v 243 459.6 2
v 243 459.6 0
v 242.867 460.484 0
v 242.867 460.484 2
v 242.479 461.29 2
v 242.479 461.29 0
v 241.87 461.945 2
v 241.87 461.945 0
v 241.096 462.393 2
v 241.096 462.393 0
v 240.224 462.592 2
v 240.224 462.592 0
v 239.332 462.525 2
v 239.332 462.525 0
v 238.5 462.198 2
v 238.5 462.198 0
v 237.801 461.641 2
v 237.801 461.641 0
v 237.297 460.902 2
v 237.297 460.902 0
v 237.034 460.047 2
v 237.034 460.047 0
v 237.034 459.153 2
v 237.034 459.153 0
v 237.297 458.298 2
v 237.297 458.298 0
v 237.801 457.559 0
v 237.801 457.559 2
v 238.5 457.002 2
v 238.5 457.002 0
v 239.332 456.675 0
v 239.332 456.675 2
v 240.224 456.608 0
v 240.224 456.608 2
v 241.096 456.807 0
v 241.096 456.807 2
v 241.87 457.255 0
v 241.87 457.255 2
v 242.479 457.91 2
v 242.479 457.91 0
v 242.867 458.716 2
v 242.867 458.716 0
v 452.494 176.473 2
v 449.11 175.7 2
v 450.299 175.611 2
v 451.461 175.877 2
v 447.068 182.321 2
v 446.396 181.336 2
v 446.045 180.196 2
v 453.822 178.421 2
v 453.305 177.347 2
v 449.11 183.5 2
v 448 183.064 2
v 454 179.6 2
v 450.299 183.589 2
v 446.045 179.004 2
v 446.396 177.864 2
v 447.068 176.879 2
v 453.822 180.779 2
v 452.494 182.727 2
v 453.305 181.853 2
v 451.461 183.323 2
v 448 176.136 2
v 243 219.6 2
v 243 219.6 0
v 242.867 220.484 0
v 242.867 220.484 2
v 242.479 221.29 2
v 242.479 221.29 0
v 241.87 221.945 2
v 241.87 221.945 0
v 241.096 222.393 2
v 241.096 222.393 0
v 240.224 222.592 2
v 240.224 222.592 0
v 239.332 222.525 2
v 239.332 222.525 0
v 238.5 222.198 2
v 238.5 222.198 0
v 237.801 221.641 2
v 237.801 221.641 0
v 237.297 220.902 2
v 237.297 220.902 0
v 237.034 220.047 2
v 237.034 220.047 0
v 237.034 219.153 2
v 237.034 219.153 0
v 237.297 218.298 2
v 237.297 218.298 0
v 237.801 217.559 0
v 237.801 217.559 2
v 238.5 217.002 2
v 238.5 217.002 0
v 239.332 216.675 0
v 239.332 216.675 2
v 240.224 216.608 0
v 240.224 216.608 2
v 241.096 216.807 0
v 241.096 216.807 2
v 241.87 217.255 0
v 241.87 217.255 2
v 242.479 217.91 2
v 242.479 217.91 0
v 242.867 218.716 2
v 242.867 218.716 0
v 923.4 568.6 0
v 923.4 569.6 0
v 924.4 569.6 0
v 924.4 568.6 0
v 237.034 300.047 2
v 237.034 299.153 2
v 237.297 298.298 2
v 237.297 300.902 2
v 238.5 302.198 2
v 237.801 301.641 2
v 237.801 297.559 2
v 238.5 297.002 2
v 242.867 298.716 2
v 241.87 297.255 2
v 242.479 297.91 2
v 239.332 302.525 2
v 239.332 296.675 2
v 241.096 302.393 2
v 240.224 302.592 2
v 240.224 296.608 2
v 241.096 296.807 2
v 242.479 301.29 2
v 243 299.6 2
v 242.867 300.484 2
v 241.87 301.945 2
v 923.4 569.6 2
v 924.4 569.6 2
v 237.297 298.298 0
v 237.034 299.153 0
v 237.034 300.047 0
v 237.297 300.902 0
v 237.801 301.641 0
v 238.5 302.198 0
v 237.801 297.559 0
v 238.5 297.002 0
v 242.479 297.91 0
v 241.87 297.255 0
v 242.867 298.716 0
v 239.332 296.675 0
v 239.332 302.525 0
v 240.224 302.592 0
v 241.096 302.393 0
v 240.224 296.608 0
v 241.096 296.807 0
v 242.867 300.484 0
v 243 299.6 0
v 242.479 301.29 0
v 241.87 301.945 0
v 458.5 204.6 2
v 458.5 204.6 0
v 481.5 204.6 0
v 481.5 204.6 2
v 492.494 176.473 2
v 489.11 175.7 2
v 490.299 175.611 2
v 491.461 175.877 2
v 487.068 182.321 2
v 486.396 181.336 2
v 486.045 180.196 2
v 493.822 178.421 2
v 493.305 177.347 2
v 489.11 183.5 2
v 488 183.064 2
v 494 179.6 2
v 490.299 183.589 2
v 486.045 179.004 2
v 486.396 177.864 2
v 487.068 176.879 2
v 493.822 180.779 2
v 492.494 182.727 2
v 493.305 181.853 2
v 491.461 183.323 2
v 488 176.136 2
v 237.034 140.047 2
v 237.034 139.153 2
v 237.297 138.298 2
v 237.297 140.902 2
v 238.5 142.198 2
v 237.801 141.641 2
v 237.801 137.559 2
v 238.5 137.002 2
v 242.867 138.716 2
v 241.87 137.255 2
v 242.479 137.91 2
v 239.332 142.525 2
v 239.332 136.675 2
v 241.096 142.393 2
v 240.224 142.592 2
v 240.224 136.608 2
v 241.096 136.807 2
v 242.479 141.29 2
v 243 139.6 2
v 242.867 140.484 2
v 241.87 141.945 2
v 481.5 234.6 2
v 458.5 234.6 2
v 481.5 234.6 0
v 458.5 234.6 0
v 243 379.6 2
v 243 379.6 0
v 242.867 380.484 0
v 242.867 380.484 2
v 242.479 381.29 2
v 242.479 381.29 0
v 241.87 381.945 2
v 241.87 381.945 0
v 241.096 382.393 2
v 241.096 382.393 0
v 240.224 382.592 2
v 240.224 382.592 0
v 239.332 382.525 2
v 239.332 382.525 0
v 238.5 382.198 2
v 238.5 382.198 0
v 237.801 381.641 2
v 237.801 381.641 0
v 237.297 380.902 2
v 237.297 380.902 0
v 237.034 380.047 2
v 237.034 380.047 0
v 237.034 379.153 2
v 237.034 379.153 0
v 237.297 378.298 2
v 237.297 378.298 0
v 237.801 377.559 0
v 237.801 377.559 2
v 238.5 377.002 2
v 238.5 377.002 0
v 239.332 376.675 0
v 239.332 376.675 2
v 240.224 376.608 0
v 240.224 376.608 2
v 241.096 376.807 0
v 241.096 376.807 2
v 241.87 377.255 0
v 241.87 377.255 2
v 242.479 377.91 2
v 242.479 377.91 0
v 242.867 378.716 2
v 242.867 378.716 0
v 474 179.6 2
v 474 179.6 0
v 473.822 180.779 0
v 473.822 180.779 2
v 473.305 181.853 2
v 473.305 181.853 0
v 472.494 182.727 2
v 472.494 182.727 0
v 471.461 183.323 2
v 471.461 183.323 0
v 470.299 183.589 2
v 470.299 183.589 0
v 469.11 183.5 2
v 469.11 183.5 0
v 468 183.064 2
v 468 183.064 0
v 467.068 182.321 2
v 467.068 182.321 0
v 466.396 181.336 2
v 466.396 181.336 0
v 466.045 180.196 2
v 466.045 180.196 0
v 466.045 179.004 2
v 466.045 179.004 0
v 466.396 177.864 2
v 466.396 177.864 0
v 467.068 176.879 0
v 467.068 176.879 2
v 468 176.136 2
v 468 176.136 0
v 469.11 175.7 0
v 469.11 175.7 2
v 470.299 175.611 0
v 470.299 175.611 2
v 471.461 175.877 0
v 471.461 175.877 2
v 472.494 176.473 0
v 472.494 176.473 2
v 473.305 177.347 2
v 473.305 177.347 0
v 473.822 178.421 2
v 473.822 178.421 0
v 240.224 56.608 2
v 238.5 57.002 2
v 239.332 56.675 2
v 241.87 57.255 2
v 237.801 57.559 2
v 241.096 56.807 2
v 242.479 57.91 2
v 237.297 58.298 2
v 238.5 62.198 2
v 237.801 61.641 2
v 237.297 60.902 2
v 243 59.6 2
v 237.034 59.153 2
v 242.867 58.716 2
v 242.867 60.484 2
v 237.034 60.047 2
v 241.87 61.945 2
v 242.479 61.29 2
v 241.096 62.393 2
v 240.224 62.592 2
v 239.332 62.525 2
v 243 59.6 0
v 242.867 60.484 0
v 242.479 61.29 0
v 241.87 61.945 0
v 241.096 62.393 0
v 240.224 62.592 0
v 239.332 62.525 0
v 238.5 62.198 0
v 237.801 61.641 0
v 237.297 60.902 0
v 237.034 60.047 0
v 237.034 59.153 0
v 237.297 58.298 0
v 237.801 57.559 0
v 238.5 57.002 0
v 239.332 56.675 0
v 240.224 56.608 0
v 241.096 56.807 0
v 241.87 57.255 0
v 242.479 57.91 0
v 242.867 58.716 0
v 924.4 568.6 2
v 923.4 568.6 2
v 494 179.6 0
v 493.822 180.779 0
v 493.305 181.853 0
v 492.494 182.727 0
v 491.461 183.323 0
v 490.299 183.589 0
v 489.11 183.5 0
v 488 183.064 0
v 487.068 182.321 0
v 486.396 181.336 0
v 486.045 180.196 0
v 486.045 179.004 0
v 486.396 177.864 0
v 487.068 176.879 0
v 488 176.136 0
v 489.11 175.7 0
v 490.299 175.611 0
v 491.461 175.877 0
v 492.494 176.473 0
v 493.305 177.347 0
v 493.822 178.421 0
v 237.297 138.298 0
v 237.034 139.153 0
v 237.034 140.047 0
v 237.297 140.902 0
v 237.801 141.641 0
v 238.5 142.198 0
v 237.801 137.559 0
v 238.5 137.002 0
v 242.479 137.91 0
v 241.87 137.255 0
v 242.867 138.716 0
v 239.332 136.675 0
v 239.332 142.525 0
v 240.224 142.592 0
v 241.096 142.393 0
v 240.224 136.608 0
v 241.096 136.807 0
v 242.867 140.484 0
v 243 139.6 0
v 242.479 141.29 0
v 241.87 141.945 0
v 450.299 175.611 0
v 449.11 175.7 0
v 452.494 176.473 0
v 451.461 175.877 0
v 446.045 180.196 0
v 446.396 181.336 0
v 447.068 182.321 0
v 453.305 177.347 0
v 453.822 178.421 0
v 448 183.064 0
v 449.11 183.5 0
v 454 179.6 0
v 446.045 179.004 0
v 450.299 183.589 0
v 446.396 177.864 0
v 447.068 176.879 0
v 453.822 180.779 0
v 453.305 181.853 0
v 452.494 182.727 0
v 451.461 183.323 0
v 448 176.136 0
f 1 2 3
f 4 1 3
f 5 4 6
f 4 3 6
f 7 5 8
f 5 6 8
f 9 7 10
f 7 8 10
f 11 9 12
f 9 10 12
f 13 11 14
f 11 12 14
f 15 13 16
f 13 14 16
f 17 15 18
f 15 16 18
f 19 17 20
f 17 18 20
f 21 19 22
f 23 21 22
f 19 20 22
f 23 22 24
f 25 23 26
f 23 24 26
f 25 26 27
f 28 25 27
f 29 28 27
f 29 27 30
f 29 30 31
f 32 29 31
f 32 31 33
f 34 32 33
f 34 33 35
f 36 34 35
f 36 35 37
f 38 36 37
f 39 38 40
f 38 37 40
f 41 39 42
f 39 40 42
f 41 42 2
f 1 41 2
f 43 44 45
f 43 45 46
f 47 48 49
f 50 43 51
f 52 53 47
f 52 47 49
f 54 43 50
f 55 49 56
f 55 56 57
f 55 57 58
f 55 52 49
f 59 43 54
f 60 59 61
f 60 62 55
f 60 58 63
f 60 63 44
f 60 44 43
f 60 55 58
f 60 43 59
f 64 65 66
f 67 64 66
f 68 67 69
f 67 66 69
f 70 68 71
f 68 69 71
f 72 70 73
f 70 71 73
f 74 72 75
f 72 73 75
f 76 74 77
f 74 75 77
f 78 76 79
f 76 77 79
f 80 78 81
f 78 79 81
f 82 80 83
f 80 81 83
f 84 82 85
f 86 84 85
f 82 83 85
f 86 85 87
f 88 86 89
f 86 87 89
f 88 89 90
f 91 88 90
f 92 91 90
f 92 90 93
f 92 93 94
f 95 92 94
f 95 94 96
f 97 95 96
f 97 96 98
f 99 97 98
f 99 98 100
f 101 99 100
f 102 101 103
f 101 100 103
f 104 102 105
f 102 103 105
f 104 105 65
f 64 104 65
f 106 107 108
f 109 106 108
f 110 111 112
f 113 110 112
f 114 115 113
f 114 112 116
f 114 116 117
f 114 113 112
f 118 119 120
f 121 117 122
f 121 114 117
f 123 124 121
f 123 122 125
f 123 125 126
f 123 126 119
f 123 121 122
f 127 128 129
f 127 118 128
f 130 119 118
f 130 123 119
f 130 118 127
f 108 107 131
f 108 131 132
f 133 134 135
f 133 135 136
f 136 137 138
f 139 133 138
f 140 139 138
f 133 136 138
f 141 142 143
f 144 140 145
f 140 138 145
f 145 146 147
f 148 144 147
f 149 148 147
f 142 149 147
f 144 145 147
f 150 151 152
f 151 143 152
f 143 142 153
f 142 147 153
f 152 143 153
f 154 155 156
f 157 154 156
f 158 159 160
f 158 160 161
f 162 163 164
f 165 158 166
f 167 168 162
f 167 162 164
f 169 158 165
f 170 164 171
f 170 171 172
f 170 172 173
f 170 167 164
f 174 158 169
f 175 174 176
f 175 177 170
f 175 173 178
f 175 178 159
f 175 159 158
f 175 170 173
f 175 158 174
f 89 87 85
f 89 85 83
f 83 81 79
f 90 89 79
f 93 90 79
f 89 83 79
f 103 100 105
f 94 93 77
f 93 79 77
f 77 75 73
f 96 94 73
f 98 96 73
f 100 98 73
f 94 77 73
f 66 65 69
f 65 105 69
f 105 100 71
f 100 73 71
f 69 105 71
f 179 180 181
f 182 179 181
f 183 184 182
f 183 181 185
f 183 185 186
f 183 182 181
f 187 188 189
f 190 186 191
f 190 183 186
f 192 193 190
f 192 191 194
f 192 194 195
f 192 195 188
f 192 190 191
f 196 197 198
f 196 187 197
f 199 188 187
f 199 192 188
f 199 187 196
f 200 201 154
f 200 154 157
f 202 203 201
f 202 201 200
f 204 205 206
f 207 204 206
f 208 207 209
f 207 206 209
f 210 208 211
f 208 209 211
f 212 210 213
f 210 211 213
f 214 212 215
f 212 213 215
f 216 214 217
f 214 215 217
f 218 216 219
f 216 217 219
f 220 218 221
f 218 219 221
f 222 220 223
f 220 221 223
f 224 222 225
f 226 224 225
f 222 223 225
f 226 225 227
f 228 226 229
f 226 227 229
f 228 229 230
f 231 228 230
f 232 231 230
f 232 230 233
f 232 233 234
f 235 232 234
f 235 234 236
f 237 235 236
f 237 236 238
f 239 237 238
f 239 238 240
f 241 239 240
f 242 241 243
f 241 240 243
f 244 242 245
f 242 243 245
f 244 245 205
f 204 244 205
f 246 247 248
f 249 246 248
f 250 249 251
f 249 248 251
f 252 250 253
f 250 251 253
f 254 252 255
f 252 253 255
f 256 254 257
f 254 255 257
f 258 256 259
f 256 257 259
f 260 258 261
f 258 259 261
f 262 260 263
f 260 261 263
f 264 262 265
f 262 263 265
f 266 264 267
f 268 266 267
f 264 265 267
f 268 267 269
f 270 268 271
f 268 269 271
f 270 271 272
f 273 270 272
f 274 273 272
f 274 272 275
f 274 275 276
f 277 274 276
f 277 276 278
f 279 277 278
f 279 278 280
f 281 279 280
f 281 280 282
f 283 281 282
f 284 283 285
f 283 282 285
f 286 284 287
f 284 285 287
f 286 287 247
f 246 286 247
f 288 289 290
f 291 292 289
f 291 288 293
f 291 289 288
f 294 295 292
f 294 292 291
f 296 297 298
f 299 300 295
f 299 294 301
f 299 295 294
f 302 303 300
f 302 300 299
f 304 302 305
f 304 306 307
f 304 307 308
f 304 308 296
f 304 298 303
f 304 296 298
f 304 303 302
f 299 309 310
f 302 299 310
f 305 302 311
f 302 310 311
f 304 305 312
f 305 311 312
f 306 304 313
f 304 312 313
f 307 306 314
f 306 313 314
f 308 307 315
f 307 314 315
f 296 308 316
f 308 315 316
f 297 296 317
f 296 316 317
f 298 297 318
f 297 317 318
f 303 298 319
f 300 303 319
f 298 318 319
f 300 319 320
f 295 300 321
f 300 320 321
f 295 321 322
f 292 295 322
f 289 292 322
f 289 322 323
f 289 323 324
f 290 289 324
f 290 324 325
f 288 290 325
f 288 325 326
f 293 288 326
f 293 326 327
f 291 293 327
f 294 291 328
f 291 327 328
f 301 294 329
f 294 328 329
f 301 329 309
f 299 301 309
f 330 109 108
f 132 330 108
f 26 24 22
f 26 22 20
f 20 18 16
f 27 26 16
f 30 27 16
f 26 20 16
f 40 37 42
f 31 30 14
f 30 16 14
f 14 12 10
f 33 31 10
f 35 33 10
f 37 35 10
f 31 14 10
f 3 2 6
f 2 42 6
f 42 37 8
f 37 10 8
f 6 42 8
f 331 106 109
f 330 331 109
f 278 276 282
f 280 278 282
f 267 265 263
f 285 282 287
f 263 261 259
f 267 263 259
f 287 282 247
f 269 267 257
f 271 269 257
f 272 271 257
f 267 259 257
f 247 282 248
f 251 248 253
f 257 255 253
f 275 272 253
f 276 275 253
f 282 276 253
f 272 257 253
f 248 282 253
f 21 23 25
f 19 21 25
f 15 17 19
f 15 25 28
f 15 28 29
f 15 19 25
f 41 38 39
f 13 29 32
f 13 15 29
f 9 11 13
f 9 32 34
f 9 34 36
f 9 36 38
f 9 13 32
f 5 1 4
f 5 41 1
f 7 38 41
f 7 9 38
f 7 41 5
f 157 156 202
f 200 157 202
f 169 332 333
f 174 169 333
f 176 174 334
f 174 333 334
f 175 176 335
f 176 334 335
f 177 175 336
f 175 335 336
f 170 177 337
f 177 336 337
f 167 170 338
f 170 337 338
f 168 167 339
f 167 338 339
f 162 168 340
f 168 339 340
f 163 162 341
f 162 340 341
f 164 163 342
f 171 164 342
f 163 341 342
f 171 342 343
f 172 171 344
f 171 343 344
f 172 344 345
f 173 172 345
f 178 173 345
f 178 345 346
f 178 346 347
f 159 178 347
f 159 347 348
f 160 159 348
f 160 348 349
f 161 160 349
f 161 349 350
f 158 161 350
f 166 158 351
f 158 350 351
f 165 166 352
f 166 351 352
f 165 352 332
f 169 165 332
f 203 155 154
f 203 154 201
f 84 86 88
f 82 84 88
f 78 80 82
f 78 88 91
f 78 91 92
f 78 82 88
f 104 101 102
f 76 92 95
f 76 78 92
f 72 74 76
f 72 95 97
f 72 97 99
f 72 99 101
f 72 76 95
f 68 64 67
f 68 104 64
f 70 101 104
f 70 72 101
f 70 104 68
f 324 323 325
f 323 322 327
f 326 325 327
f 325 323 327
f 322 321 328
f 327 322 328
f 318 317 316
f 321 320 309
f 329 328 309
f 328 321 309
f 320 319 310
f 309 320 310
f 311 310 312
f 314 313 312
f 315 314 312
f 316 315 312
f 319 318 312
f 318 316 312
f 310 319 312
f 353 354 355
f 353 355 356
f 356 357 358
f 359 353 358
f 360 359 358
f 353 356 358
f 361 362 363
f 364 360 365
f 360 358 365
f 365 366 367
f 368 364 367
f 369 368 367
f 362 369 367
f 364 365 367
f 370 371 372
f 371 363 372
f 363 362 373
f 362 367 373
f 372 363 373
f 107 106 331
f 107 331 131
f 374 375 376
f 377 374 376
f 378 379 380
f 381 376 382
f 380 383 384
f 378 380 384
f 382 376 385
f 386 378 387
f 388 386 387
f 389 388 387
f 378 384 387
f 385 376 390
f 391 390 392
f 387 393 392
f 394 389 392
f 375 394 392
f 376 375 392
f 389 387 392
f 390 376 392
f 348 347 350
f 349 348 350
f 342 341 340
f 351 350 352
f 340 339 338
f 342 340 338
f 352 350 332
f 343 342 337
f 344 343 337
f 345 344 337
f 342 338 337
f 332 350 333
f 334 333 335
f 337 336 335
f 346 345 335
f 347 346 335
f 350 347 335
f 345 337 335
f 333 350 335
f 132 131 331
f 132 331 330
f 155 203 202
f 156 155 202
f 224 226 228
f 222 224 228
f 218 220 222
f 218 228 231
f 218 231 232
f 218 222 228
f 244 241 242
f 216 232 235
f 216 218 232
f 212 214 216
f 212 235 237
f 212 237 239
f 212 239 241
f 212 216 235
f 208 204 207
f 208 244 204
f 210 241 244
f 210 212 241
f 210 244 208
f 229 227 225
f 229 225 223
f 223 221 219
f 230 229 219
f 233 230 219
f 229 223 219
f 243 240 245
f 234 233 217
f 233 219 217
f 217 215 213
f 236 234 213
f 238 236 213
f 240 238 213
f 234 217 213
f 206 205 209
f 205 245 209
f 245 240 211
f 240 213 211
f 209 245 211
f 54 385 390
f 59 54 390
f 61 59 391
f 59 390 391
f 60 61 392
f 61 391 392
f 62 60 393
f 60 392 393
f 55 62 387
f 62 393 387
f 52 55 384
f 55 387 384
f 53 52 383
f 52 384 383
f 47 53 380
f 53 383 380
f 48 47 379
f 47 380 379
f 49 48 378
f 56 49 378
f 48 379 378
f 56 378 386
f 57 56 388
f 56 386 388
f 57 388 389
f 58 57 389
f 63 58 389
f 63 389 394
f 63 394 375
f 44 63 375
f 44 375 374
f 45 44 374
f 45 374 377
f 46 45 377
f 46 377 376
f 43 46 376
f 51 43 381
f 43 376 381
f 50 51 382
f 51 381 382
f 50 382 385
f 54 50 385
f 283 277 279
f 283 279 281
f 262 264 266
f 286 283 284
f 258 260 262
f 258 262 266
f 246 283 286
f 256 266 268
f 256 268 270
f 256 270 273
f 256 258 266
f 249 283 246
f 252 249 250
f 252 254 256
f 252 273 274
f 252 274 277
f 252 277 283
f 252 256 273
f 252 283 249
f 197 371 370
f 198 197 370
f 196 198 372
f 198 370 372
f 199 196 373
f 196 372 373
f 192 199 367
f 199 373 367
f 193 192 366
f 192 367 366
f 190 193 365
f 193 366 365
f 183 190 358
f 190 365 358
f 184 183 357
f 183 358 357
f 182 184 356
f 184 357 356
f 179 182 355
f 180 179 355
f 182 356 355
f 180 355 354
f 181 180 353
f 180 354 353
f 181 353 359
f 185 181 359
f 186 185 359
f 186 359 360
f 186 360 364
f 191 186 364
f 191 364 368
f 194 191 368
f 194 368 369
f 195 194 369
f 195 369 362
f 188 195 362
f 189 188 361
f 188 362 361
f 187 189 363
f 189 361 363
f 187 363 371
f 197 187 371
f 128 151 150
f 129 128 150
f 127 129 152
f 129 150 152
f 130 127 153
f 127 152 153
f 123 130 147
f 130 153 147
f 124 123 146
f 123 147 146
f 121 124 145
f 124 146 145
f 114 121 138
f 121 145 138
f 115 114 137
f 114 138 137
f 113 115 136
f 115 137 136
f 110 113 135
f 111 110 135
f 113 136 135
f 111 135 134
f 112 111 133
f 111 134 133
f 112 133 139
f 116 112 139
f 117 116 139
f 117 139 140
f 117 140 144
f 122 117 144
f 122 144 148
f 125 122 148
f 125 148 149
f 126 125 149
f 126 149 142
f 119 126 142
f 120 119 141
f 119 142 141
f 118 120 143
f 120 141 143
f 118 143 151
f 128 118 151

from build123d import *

# Parameters (mm, degrees)
SKETCH1_R              = 3
BOSS_EXTRUDE1_DEPTH    = 2
BOSS_EXTRUDE1_2_DEPTH  = 2
BOSS_EXTRUDE1_3_DEPTH  = 2
BOSS_EXTRUDE1_4_DEPTH  = 2
BOSS_EXTRUDE1_5_DEPTH  = 2
BOSS_EXTRUDE1_6_DEPTH  = 2
SKETCH1_W              = 23
SKETCH1_H              = 30
BOSS_EXTRUDE1_7_DEPTH  = 2
SKETCH1_R_2            = 4
BOSS_EXTRUDE1_8_DEPTH  = 2
BOSS_EXTRUDE1_9_DEPTH  = 2
BOSS_EXTRUDE1_10_DEPTH = 2
SKETCH1_W_2            = 1
SKETCH1_H_2            = 1
BOSS_EXTRUDE1_11_DEPTH = 2


with BuildPart() as part:
    # Sketch1 → Boss-Extrude1 (new body)
    with BuildSketch(Plane.XY):
        with Locations((240, 299.6)):
            Circle(SKETCH1_R)
    extrude(amount=BOSS_EXTRUDE1_DEPTH)


with BuildPart() as body_2:
    # Sketch1 → Boss-Extrude1 2 (new body)
    with BuildSketch(Plane.XY):
        with Locations((240, 379.6)):
            Circle(SKETCH1_R)
    extrude(amount=BOSS_EXTRUDE1_2_DEPTH)


with BuildPart() as body_3:
    # Sketch1 → Boss-Extrude1 3 (new body)
    with BuildSketch(Plane.XY):
        with Locations((240, 459.6)):
            Circle(SKETCH1_R)
    extrude(amount=BOSS_EXTRUDE1_3_DEPTH)


with BuildPart() as body_4:
    # Sketch1 → Boss-Extrude1 4 (new body)
    with BuildSketch(Plane.XY):
        with Locations((240, 219.6)):
            Circle(SKETCH1_R)
    extrude(amount=BOSS_EXTRUDE1_4_DEPTH)


with BuildPart() as body_5:
    # Sketch1 → Boss-Extrude1 5 (new body)
    with BuildSketch(Plane.XY):
        with Locations((240, 139.6)):
            Circle(SKETCH1_R)
    extrude(amount=BOSS_EXTRUDE1_5_DEPTH)


with BuildPart() as body_6:
    # Sketch1 → Boss-Extrude1 6 (new body)
    with BuildSketch(Plane.XY):
        with Locations((240, 59.6)):
            Circle(SKETCH1_R)
    extrude(amount=BOSS_EXTRUDE1_6_DEPTH)


with BuildPart() as body_7:
    # Sketch1 → Boss-Extrude1 7 (new body)
    with BuildSketch(Plane.XY):
        with Locations((470, 219.6)):
            Rectangle(SKETCH1_W, SKETCH1_H)
    extrude(amount=BOSS_EXTRUDE1_7_DEPTH)


with BuildPart() as body_8:
    # Sketch1 → Boss-Extrude1 8 (new body)
    with BuildSketch(Plane.XY):
        with Locations((490, 179.6)):
            Circle(SKETCH1_R_2)
    extrude(amount=BOSS_EXTRUDE1_8_DEPTH)


with BuildPart() as body_9:
    # Sketch1 → Boss-Extrude1 9 (new body)
    with BuildSketch(Plane.XY):
        with Locations((470, 179.6)):
            Circle(SKETCH1_R_2)
    extrude(amount=BOSS_EXTRUDE1_9_DEPTH)


with BuildPart() as body_10:
    # Sketch1 → Boss-Extrude1 10 (new body)
    with BuildSketch(Plane.XY):
        with Locations((450, 179.6)):
            Circle(SKETCH1_R_2)
    extrude(amount=BOSS_EXTRUDE1_10_DEPTH)


with BuildPart() as body_11:
    # Sketch1 → Boss-Extrude1 11 (new body)
    with BuildSketch(Plane.XY):
        with Locations((923.9, 569.1)):
            Rectangle(SKETCH1_W_2, SKETCH1_H_2)
    extrude(amount=BOSS_EXTRUDE1_11_DEPTH)


solid = Compound([part.part, body_2.part, body_3.part, body_4.part, body_5.part, body_6.part, body_7.part, body_8.part, body_9.part, body_10.part, body_11.part])
